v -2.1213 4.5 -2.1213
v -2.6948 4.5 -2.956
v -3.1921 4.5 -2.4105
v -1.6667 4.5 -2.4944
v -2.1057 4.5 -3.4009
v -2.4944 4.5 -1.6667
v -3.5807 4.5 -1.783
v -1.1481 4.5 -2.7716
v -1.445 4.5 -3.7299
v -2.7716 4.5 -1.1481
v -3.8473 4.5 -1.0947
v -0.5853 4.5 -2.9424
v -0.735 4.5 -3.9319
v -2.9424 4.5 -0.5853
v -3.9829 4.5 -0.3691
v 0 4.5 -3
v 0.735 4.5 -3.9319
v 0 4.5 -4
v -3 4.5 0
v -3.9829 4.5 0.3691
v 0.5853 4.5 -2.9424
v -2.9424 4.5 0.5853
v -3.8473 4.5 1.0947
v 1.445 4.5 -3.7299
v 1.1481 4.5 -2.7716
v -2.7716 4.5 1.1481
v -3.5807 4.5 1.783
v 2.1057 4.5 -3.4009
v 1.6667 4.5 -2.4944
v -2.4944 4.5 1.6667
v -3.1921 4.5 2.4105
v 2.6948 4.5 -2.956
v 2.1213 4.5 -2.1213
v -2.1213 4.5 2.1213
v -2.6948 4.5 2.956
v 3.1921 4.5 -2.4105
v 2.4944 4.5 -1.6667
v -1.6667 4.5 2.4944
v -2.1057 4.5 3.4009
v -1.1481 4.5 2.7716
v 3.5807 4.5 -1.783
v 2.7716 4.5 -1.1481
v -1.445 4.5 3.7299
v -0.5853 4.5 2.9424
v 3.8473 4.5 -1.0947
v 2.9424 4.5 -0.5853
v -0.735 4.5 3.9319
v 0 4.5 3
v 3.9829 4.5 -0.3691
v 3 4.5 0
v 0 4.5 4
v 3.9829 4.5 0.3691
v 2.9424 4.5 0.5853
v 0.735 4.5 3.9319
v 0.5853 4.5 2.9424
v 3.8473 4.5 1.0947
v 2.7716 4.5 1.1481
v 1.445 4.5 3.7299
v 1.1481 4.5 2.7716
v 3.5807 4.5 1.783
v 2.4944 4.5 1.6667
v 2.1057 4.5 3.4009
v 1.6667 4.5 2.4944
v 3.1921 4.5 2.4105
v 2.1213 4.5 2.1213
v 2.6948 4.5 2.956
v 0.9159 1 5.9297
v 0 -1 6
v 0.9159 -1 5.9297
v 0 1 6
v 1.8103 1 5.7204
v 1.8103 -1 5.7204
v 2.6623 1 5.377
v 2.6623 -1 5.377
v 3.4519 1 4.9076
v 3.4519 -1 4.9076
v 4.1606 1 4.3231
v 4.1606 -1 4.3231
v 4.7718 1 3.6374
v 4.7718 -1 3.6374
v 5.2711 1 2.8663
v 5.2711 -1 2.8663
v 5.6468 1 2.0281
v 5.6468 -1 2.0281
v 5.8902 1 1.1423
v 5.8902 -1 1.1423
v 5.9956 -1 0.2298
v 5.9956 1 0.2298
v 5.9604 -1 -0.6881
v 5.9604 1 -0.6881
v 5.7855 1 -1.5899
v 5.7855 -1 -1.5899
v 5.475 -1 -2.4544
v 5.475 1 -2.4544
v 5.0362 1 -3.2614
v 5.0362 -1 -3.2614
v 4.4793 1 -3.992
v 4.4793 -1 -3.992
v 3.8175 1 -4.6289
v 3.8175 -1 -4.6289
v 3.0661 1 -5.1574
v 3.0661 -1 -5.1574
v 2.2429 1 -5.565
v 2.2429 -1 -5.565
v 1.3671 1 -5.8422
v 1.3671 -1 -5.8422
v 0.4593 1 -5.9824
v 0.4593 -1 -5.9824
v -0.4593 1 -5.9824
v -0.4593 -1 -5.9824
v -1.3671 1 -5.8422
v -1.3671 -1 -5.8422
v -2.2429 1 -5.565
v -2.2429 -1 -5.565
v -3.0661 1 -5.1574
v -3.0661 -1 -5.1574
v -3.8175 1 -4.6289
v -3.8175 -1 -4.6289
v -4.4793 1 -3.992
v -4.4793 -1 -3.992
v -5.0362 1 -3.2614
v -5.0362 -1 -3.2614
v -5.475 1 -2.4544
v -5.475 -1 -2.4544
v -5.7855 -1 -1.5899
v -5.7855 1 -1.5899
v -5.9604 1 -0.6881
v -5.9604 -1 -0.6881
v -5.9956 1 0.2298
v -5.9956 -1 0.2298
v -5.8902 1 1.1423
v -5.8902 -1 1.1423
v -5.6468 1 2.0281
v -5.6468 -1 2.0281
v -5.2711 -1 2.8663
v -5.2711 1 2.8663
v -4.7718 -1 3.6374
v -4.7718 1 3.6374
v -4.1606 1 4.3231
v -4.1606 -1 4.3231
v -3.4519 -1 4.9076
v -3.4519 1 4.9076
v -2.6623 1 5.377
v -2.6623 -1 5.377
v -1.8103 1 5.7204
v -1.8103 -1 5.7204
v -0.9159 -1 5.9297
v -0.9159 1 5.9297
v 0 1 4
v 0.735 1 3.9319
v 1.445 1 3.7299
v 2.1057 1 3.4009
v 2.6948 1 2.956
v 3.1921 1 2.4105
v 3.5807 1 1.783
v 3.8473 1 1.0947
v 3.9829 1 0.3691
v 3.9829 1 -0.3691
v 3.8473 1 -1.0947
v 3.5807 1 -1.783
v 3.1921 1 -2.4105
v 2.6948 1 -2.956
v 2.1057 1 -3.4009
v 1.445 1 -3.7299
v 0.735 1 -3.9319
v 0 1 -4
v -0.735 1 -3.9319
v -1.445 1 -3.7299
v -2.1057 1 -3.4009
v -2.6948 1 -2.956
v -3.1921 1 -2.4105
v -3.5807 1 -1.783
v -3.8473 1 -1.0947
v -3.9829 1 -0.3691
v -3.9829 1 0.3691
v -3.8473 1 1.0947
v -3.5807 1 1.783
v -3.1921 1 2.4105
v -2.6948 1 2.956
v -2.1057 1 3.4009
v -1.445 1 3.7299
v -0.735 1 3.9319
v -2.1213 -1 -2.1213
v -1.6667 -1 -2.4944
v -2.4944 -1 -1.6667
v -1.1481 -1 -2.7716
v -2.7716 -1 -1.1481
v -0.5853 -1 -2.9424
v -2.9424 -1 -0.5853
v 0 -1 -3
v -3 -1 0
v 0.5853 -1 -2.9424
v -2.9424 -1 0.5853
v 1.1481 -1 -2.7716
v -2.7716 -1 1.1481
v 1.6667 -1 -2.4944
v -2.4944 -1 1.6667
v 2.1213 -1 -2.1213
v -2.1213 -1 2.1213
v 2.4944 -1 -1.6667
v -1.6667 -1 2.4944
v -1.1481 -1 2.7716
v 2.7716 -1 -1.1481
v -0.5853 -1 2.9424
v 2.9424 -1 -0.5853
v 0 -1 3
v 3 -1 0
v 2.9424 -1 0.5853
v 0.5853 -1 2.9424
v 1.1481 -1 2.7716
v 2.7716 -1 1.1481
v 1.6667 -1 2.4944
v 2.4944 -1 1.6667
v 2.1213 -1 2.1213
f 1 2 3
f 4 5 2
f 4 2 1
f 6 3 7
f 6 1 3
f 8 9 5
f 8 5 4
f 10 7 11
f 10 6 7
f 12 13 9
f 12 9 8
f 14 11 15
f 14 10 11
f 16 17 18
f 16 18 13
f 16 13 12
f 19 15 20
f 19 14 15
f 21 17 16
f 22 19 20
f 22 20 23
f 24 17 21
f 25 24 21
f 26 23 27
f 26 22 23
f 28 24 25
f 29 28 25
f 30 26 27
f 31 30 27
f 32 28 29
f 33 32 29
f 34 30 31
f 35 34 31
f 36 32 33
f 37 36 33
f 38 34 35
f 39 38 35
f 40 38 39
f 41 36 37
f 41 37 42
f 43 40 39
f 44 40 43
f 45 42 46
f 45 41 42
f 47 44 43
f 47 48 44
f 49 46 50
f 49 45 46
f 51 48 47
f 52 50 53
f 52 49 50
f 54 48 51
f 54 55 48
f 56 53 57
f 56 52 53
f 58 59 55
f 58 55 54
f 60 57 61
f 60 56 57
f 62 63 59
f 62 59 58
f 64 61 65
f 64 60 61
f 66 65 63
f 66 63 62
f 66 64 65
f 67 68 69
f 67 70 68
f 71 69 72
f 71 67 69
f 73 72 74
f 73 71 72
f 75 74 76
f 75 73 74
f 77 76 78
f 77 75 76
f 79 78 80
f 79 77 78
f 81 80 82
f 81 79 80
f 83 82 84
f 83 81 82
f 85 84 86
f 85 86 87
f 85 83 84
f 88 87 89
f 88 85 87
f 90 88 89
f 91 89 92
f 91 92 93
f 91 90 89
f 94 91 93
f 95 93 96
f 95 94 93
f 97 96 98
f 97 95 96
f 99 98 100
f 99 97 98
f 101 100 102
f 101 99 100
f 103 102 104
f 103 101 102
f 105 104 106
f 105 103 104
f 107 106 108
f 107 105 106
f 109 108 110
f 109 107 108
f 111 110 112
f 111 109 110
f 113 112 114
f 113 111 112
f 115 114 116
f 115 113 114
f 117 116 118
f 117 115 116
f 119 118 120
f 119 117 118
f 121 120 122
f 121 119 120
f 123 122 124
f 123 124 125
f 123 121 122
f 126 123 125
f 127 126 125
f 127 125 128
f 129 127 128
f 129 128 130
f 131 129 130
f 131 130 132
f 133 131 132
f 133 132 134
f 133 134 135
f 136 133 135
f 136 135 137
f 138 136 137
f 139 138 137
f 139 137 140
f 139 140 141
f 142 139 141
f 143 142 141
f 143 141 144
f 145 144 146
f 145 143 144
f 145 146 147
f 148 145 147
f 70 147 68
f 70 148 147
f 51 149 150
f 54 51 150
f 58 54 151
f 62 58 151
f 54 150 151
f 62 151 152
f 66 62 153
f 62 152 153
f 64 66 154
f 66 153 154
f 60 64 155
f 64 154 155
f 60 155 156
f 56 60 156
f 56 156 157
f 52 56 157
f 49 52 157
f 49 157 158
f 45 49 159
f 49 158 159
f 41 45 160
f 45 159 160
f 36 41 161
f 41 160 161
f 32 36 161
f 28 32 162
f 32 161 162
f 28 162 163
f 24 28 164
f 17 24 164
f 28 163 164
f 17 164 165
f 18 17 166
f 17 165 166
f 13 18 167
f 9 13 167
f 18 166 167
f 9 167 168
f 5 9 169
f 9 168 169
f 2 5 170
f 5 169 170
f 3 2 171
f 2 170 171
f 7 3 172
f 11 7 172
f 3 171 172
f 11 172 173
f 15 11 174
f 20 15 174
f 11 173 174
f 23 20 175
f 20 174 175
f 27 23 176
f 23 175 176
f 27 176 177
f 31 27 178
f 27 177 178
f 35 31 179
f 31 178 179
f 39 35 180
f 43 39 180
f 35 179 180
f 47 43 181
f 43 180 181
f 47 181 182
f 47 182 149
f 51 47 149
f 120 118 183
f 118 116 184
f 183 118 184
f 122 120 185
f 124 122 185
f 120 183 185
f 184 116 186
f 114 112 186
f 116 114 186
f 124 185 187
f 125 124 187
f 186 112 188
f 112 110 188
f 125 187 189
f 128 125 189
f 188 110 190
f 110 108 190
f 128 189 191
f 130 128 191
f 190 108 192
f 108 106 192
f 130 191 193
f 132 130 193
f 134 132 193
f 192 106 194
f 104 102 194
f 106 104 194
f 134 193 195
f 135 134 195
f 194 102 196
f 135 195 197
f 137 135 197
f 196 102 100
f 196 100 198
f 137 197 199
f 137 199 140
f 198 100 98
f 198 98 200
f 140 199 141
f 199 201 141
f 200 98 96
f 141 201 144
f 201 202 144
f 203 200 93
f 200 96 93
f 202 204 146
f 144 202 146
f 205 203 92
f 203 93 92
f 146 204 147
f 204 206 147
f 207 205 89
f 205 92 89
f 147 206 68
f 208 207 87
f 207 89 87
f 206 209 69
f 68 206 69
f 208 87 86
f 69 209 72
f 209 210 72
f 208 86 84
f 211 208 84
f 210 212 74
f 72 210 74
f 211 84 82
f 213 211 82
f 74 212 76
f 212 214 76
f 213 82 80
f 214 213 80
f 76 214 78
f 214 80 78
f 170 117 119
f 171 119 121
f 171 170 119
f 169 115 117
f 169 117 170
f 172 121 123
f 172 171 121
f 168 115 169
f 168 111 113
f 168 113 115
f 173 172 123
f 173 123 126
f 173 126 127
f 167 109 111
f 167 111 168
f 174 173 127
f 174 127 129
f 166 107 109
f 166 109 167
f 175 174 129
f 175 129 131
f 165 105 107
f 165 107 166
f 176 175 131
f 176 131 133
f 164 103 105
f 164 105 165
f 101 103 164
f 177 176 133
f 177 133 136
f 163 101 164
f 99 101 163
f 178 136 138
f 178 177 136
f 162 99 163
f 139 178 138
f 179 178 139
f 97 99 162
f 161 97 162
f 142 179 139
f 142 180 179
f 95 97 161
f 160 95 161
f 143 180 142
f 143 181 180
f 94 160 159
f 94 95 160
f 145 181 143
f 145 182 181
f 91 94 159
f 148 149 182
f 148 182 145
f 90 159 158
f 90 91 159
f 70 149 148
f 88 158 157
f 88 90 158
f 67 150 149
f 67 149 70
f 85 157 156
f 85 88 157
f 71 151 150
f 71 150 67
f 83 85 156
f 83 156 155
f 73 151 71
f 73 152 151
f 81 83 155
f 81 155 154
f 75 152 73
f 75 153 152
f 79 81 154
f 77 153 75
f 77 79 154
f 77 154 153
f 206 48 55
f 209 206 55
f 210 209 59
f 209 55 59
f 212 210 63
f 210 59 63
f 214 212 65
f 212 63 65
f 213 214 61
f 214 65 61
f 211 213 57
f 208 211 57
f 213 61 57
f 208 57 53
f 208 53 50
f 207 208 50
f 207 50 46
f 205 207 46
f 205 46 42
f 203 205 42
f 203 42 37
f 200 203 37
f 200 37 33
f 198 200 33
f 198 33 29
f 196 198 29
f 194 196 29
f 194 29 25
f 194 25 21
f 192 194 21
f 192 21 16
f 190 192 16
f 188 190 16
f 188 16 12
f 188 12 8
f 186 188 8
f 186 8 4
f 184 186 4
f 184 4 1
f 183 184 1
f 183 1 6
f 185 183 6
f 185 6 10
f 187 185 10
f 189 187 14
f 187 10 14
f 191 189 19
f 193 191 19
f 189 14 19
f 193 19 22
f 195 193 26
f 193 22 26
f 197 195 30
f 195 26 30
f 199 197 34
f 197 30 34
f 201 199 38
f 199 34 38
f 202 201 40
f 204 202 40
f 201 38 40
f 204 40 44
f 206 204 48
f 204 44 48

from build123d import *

# Parameters (mm, degrees)
SKETCH1_R           = 6
BOSS_EXTRUDE1_DEPTH = 1
SKETCH2_R           = 4
BOSS_EXTRUDE2_DEPTH = 3.5
SKETCH3_R           = 3
CUT_EXTRUDE1_DEPTH  = 11.111874208


with BuildPart() as part:
    # Sketch1 → Boss-Extrude1 (new, symmetric)
    with BuildSketch(Plane(origin=(0, 0, 0), x_dir=(1, 0, 0), z_dir=(0, 1, 0))):
        with Locations(Location((0, 0, 0), (0, 0, 270))):
            Circle(SKETCH1_R)
    extrude(amount=BOSS_EXTRUDE1_DEPTH, both=True)

    # Sketch2 → Boss-Extrude2 (add)
    with BuildSketch(Plane(origin=(0, 1, 0), x_dir=(1, 0, 0), z_dir=(0, 1, 0))):
        with Locations(Location((0, 0, 0), (0, 0, 270))):
            Circle(SKETCH2_R)
    extrude(amount=BOSS_EXTRUDE2_DEPTH)

    # Sketch3 → Cut-Extrude1 (cut, through all)
    with BuildSketch(Plane(origin=(0, 4.5, 0), x_dir=(1, 0, 0), z_dir=(0, 1, 0))):
        with Locations(Location((0, 0, 0), (0, 0, 270))):
            Circle(SKETCH3_R)
    extrude(amount=-CUT_EXTRUDE1_DEPTH, mode=Mode.SUBTRACT)


solid = part.part
